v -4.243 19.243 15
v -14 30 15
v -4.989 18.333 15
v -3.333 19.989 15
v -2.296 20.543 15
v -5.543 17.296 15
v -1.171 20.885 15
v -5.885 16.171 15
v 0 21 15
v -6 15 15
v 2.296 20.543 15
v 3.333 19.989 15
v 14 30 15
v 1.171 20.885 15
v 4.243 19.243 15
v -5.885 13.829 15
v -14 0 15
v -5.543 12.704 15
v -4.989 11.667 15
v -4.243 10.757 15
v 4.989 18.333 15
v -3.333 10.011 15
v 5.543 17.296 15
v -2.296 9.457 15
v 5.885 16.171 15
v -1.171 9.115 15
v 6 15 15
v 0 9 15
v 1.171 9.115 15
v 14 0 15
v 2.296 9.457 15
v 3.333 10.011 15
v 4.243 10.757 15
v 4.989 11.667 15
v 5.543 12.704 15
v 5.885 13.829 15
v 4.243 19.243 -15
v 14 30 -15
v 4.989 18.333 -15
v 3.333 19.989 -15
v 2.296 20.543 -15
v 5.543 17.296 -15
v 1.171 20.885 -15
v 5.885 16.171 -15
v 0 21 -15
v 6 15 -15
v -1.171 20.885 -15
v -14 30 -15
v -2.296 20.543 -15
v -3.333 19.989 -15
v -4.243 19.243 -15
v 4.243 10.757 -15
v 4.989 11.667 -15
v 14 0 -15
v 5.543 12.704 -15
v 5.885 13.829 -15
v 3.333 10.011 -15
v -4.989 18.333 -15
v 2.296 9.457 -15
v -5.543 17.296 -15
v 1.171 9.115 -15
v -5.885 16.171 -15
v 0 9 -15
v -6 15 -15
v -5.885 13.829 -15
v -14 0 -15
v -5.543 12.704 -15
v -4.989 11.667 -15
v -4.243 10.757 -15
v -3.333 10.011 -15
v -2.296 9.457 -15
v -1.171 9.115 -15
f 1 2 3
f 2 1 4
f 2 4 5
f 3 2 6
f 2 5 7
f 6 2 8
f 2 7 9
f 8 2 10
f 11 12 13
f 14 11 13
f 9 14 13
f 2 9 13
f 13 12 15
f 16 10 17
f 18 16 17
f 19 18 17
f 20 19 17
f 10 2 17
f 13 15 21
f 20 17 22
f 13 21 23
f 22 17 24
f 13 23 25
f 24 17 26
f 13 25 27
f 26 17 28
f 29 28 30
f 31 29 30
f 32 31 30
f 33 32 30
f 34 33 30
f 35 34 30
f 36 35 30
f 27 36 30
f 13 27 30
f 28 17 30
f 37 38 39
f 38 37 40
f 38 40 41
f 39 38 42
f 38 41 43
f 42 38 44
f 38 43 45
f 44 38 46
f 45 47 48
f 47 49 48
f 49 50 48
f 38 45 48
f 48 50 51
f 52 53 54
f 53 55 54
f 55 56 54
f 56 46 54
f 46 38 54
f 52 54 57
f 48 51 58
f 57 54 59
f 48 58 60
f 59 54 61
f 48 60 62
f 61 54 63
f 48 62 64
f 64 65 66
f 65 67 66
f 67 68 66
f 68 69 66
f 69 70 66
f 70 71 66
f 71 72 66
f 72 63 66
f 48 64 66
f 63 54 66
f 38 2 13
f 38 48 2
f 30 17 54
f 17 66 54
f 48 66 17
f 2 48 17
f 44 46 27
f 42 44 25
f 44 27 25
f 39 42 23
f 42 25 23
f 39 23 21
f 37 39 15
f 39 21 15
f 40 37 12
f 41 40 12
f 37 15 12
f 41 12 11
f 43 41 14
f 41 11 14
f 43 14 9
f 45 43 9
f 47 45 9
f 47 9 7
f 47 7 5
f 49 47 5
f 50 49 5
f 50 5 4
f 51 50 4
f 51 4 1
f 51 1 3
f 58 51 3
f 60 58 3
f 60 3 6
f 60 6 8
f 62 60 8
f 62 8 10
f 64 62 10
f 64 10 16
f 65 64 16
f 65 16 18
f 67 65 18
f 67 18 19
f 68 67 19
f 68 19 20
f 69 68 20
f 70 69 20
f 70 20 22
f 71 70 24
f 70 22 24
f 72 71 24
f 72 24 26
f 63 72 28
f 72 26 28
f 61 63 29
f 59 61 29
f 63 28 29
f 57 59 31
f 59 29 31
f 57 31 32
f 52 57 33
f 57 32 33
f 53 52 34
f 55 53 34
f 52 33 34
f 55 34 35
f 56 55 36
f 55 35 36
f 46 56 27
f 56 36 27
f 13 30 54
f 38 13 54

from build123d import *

# Parameters (mm, degrees)
BOSS_EXTRUDE1_DEPTH = 30
SKETCH2_R           = 6
CUT_EXTRUDE1_DEPTH  = 45.676615807


with BuildPart() as part:
    # Sketch1 → Boss-Extrude1 (new body)
    with BuildSketch(Plane(origin=(0, 0, 0), x_dir=(1, 0, 0), z_dir=(0, 1, 0))):
        Polygon((-14, 0), (-14, -15), (14, -15), (14, 15), (-14, 15), align=None)
    extrude(amount=BOSS_EXTRUDE1_DEPTH)

    # Sketch2 → Cut-Extrude1 (cut, through all)
    with BuildSketch(Plane.XY.offset(15)):
        with Locations((0, 15)):
            Circle(SKETCH2_R)
    extrude(amount=-CUT_EXTRUDE1_DEPTH, mode=Mode.SUBTRACT)


solid = part.part
